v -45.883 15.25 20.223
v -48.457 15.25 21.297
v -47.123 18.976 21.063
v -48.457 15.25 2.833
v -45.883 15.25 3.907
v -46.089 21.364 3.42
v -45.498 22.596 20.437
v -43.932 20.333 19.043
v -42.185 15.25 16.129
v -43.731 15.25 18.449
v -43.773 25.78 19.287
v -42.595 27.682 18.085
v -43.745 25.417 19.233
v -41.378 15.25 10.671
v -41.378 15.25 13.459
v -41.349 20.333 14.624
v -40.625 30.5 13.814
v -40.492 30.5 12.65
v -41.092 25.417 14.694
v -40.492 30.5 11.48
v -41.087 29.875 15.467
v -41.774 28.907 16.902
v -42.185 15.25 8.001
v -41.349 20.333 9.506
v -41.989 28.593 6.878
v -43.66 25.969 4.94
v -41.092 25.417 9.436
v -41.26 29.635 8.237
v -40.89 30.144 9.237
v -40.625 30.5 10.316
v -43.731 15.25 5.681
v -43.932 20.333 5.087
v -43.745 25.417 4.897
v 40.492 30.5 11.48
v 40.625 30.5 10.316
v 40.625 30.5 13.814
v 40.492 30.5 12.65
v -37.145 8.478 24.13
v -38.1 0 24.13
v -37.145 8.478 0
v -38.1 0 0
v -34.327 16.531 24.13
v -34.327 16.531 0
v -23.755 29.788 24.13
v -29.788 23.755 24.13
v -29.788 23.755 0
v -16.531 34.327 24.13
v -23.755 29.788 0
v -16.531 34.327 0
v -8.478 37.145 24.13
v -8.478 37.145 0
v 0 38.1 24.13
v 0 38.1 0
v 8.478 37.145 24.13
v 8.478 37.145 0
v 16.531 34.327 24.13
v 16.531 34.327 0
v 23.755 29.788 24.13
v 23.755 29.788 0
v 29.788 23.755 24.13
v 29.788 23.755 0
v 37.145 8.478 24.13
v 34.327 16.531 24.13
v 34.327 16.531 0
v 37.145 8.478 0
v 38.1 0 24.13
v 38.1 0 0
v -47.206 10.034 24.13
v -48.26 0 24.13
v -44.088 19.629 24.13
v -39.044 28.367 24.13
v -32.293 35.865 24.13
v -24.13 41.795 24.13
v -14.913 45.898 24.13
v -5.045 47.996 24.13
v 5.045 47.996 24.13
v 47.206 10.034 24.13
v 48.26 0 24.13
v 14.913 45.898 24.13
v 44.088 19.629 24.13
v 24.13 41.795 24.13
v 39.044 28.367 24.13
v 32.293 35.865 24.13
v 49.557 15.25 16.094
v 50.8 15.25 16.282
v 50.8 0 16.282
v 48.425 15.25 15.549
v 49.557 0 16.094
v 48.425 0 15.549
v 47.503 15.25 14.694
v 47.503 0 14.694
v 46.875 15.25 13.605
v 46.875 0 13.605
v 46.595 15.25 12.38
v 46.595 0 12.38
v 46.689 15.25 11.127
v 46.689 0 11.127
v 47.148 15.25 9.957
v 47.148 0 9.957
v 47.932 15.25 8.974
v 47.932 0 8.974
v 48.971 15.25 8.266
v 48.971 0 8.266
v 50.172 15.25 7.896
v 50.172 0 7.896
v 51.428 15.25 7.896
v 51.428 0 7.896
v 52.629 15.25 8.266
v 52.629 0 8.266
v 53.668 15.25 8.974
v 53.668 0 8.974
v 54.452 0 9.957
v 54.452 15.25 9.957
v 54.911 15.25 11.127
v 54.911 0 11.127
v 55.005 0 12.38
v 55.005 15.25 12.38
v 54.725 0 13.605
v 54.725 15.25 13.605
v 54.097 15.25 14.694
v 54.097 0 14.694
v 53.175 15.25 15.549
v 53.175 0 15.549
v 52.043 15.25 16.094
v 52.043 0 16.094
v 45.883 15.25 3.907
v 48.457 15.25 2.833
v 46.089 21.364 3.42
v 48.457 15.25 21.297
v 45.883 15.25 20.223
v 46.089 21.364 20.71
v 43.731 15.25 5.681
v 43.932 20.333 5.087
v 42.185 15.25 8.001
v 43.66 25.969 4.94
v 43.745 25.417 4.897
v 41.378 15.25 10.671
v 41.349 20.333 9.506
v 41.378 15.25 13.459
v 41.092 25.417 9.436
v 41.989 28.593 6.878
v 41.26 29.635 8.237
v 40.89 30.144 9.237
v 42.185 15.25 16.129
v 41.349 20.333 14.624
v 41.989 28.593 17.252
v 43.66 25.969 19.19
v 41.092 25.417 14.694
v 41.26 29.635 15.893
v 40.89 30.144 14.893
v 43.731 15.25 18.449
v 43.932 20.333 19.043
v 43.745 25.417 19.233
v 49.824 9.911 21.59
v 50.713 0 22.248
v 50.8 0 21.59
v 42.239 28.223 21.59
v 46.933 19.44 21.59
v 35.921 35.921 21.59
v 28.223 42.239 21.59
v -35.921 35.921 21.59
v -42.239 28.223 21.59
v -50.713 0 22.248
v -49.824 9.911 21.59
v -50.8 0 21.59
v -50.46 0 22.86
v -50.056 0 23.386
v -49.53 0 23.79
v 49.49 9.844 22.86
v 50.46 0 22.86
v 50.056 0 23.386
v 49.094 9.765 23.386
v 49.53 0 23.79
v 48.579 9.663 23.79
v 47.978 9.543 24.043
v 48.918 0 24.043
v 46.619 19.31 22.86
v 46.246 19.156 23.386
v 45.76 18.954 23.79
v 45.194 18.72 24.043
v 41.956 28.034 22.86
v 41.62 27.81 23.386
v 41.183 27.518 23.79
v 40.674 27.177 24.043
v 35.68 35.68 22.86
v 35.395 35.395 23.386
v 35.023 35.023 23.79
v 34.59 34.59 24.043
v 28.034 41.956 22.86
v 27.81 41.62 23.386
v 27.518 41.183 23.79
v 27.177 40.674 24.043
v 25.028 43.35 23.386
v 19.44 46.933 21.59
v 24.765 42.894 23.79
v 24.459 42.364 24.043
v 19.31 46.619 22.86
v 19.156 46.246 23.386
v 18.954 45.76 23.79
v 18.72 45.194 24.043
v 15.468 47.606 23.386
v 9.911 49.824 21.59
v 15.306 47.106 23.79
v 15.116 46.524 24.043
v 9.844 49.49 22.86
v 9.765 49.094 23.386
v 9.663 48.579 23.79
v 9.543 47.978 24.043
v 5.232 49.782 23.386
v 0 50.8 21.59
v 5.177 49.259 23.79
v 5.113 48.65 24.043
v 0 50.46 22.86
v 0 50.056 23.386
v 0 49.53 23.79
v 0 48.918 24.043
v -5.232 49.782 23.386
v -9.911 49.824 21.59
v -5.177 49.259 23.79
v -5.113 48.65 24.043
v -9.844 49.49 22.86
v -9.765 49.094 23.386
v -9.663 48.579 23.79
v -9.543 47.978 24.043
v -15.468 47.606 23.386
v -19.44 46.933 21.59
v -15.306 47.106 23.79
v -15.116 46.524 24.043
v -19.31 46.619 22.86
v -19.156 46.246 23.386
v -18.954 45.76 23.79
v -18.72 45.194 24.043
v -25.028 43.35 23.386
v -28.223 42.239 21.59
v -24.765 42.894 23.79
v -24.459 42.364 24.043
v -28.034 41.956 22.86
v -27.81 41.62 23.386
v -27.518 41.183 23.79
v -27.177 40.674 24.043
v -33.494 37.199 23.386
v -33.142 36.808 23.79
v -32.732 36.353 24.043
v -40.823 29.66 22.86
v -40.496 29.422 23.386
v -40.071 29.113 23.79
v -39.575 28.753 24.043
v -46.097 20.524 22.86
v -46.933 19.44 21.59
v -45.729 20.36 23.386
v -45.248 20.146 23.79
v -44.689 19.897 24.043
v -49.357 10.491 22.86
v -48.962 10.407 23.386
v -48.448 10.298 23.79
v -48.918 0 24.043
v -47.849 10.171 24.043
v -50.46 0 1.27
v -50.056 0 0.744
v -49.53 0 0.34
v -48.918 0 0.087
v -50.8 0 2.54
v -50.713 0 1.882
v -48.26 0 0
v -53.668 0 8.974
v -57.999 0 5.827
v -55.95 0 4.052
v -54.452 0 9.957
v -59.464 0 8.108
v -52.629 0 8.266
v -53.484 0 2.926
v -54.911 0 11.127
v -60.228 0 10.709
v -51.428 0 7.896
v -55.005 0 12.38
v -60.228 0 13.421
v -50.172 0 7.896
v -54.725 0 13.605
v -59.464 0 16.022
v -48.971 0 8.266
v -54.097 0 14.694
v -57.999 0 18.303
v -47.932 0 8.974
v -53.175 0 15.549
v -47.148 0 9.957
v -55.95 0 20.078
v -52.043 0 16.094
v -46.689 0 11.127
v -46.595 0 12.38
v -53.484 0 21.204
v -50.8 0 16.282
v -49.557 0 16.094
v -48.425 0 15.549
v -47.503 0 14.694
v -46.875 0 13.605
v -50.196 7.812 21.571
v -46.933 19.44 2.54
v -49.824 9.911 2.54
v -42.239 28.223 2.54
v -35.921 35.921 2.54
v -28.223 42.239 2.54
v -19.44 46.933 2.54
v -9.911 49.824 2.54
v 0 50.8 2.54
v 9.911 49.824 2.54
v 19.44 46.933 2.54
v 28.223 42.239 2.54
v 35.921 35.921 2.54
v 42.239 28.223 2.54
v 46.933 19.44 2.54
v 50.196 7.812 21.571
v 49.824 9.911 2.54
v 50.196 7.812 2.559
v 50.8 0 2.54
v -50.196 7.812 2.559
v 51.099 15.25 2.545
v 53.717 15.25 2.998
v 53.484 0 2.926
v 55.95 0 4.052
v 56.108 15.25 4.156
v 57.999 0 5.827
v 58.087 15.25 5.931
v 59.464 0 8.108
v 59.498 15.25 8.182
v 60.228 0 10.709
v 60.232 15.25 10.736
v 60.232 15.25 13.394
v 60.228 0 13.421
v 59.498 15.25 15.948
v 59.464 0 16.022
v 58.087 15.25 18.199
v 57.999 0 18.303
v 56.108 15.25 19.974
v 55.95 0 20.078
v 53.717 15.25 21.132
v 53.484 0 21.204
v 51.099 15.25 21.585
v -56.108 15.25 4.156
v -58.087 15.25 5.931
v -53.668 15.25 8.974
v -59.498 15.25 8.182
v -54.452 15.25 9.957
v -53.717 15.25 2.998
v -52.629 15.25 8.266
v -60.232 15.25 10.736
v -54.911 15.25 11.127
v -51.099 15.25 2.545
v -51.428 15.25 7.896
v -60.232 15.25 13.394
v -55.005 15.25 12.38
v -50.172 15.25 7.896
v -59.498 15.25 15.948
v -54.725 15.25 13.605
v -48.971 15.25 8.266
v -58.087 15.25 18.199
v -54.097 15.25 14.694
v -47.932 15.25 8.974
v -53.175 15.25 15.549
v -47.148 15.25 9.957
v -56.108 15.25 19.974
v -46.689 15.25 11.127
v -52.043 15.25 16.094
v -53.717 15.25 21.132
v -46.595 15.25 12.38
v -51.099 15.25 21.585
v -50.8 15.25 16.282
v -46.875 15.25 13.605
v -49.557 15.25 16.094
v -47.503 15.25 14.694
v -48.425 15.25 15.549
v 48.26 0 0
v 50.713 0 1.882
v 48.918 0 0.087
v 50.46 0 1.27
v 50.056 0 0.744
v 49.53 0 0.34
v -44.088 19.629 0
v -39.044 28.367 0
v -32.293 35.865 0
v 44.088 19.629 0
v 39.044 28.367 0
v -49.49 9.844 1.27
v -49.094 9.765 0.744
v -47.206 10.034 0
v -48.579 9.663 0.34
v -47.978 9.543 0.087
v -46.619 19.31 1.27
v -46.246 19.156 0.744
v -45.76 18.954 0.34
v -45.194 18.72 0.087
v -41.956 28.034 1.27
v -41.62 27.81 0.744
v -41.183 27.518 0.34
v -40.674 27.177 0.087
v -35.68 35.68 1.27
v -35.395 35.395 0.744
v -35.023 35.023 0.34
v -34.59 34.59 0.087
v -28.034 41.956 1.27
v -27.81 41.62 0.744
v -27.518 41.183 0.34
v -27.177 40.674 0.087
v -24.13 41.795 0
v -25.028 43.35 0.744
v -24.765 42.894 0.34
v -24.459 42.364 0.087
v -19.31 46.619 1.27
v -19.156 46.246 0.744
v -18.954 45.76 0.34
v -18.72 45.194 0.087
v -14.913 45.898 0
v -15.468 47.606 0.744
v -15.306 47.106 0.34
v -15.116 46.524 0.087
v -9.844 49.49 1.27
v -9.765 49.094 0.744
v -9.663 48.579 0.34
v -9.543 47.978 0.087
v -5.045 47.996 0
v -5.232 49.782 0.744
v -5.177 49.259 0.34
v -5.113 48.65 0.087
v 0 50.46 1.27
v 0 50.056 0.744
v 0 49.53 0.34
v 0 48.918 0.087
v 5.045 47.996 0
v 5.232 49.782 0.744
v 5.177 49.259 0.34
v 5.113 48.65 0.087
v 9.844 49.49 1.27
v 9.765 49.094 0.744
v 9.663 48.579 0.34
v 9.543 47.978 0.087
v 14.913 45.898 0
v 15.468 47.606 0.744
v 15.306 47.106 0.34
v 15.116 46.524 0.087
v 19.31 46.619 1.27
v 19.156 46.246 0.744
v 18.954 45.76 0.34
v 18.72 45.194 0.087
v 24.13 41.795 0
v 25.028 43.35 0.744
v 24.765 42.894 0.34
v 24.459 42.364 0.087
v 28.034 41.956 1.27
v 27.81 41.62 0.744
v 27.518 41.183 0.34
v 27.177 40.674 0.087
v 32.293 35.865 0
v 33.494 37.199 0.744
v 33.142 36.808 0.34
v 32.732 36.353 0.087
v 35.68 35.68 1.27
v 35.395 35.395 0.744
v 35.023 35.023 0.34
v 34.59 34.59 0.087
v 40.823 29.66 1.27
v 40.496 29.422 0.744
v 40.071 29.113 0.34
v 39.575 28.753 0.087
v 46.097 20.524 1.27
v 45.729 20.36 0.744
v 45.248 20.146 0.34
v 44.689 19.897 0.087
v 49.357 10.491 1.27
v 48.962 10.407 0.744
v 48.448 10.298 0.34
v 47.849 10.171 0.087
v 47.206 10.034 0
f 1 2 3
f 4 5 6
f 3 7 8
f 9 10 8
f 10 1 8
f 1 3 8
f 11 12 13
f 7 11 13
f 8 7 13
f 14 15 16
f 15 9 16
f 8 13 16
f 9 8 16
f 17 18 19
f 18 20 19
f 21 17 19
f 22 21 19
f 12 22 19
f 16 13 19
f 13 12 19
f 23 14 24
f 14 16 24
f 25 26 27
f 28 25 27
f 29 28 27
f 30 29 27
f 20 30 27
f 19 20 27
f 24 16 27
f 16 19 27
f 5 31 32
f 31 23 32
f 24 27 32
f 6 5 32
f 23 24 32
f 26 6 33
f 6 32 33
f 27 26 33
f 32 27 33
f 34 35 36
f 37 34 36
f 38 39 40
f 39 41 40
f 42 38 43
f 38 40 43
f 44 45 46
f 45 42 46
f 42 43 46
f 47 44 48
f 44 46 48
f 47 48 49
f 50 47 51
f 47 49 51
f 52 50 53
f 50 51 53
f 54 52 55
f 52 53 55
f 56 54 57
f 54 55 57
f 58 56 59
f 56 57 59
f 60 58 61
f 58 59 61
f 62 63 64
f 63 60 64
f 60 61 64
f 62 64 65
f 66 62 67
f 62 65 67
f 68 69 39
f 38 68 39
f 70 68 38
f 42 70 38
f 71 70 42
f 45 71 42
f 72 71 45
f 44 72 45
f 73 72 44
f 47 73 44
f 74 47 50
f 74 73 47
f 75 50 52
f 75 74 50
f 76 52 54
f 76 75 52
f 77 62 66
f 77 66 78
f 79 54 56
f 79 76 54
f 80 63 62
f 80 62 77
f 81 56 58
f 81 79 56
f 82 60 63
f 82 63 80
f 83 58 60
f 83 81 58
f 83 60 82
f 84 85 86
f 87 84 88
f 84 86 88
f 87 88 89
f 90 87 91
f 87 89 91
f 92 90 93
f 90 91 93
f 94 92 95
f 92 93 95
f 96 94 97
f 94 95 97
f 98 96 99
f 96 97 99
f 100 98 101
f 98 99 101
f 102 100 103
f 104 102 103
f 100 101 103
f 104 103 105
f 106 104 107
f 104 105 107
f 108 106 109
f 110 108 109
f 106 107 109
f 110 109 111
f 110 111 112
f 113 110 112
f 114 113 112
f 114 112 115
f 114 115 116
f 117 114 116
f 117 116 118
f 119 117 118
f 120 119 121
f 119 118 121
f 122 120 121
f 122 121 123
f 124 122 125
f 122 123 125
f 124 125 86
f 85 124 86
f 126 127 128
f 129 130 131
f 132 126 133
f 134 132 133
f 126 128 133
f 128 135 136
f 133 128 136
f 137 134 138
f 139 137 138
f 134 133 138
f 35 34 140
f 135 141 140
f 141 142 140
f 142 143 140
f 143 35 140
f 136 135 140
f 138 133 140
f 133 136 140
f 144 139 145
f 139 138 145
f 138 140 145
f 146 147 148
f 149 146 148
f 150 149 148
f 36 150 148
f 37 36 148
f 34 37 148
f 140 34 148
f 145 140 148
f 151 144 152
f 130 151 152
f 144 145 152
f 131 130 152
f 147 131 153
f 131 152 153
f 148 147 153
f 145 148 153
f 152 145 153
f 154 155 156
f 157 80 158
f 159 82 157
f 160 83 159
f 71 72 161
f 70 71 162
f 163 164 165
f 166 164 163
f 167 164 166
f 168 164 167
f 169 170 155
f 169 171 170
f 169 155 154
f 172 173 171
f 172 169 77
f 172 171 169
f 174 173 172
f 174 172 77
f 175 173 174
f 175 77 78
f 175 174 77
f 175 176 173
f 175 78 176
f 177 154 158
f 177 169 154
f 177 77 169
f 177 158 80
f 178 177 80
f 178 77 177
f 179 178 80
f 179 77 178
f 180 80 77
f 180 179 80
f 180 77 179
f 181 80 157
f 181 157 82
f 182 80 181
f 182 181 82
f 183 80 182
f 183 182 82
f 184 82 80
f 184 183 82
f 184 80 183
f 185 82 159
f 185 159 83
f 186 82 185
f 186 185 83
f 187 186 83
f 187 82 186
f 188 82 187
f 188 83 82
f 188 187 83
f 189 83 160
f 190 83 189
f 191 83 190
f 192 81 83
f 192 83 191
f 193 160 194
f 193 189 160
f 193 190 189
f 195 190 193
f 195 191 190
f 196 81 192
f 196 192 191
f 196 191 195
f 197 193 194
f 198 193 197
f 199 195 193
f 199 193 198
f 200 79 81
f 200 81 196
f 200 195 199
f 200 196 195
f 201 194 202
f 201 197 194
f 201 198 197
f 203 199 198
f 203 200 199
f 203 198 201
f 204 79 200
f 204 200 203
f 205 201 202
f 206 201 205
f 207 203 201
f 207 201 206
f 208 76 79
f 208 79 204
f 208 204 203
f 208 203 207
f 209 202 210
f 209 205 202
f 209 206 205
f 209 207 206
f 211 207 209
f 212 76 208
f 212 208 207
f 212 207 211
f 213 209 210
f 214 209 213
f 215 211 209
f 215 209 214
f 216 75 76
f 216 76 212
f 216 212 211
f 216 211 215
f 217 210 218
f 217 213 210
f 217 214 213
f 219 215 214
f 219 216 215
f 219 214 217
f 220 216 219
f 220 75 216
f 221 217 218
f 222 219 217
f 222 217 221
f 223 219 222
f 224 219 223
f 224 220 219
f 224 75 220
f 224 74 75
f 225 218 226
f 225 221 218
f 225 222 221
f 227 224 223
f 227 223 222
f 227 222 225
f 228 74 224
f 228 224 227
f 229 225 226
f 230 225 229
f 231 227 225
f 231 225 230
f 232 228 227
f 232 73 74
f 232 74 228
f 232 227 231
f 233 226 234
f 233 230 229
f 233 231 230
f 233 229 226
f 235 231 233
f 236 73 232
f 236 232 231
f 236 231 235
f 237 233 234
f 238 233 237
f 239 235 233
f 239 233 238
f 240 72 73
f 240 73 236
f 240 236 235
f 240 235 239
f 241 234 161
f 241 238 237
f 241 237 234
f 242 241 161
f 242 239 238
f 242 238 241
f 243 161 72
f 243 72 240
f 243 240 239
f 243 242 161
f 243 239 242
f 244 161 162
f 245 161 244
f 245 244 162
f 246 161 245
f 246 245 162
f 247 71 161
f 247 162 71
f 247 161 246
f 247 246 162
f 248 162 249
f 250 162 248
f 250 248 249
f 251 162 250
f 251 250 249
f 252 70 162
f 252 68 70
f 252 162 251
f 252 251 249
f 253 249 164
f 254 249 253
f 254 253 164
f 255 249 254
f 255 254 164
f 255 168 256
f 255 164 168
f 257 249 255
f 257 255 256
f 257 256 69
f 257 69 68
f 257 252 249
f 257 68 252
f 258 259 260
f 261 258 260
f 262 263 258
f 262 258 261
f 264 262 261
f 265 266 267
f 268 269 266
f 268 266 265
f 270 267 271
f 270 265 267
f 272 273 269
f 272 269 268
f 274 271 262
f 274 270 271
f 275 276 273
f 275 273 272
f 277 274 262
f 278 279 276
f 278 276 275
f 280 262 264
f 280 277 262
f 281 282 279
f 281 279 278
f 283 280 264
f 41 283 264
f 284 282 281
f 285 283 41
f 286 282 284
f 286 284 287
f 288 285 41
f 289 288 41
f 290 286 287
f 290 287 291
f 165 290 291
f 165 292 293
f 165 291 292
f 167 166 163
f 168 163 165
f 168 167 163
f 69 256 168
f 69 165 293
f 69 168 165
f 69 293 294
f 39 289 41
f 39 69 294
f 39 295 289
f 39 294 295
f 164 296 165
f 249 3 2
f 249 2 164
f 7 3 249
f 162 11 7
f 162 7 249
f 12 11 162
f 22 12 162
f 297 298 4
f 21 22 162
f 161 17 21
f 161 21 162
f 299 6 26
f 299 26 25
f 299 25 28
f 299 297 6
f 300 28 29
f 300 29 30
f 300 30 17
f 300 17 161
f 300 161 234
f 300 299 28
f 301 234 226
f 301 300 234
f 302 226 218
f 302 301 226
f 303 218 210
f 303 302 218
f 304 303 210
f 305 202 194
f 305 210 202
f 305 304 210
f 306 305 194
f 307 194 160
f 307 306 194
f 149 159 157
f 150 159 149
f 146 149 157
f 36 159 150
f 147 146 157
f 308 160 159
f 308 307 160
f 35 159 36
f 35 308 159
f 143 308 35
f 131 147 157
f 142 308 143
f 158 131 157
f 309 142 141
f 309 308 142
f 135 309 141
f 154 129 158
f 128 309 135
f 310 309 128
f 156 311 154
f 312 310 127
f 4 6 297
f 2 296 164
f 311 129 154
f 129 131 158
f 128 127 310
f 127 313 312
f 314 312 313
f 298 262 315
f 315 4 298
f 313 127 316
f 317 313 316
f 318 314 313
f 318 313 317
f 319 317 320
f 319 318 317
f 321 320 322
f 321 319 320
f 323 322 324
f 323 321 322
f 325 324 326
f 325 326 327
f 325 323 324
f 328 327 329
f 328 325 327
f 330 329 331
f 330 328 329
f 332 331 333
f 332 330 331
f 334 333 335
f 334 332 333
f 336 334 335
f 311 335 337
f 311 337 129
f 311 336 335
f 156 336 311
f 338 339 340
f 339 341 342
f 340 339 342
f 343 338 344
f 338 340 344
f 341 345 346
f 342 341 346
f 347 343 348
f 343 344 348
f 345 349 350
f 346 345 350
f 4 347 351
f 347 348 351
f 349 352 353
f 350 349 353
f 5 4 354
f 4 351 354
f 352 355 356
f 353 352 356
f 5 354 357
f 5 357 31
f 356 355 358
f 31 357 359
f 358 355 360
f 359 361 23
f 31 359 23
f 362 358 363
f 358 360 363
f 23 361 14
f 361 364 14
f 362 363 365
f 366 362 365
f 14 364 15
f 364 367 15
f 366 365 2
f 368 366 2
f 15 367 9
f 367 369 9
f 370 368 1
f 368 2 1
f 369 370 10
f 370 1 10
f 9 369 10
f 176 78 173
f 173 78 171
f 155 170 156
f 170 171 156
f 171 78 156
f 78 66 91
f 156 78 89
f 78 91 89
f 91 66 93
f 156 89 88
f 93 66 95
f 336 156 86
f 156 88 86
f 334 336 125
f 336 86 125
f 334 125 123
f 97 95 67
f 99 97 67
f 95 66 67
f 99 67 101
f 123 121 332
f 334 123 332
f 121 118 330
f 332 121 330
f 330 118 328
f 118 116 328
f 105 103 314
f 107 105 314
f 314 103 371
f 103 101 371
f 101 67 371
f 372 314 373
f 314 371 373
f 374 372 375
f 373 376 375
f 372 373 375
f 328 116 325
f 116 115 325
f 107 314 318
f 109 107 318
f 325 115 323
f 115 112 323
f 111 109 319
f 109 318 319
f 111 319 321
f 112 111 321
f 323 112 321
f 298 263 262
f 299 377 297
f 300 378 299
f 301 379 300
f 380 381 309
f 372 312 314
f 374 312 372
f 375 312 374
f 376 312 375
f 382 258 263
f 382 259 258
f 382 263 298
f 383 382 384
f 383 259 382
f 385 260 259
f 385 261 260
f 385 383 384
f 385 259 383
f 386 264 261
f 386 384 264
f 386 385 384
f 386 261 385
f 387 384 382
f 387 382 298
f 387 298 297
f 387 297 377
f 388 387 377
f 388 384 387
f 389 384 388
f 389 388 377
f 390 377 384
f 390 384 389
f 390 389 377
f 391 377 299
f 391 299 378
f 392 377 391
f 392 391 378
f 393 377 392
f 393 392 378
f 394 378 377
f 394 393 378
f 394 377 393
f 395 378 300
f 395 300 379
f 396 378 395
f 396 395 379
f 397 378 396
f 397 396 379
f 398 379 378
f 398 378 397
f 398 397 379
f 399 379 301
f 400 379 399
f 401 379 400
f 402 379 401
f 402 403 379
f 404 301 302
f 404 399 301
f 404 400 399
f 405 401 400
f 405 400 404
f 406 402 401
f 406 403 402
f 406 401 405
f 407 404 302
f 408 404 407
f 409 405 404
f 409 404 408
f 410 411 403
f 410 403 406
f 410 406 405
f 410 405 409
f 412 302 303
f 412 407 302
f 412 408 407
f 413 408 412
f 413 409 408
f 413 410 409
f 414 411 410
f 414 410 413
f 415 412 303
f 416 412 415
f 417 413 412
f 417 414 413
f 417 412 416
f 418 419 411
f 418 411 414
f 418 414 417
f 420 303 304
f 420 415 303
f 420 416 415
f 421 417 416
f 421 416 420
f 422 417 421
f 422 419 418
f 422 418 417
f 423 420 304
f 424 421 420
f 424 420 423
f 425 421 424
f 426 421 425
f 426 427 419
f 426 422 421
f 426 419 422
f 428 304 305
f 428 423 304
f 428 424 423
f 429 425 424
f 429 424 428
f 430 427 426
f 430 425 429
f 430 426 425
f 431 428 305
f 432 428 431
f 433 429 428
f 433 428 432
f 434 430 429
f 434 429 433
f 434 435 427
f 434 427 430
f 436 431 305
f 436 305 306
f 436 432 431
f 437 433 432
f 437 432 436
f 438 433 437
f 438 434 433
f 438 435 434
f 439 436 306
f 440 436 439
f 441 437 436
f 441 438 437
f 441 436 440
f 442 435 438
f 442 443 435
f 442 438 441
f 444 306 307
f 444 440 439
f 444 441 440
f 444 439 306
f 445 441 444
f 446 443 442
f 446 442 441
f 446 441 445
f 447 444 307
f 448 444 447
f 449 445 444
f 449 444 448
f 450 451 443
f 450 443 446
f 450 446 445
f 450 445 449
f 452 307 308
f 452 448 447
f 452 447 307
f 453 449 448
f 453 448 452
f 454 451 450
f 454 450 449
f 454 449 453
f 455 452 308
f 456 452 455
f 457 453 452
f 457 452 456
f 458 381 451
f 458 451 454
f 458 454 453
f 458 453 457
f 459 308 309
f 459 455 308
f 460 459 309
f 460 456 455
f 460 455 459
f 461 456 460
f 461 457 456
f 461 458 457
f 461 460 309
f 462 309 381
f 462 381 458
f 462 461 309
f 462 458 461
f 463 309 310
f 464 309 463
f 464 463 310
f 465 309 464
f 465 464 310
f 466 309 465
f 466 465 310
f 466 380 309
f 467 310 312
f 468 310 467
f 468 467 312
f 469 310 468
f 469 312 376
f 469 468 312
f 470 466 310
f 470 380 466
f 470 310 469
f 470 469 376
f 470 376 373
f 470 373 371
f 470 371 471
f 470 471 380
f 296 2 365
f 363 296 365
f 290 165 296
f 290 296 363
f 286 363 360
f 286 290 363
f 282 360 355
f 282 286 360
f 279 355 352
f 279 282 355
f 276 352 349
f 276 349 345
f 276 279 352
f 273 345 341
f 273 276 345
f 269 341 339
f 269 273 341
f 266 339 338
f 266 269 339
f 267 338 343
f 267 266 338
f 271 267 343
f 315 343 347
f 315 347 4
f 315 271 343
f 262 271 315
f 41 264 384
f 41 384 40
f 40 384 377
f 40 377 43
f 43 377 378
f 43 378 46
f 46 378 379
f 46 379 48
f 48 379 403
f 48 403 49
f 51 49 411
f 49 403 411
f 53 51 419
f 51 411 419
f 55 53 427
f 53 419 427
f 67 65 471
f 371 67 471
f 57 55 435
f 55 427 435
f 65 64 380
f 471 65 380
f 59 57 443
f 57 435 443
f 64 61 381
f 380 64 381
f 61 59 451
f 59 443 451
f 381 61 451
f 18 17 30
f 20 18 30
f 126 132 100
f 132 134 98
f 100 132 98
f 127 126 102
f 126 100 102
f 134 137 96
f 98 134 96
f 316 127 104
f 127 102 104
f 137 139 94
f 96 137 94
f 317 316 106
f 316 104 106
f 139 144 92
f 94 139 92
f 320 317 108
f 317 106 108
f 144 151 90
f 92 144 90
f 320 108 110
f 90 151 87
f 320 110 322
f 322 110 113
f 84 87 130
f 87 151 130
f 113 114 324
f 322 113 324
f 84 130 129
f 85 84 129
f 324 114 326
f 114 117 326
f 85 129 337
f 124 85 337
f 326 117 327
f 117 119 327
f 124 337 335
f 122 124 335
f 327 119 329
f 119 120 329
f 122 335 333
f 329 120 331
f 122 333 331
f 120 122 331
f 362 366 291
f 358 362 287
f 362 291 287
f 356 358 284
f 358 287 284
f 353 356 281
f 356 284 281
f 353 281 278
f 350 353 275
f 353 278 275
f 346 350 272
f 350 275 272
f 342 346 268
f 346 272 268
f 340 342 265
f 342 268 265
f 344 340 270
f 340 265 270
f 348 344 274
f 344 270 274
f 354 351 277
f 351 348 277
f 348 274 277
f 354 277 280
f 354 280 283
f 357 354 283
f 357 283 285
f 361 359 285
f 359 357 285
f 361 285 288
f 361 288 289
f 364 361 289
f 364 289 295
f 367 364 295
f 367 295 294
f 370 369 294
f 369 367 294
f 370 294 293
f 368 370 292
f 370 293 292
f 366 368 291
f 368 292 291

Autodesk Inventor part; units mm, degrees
ref_plane "YZ Plane" through (0, 0, 0) normal (1, 0, 0) x (0, 1, 0)
ref_plane "XZ Plane" through (0, 0, 0) normal (0, 1, 0) x (-1, 0, 0)
ref_plane "XY Plane" through (0, 0, 0) normal (0, 0, 1) x (1, 0, 0)
sketch "Sketch1" plane through (0, 0, 0) normal (0, 0, 1) x (1, 0, 0)
  arc A0 (38.1, 0) -> (-38.1, 0) centre (0, 0) ccw
  arc A1 (50.8, 0) -> (-50.8, 0) centre (0, 0) ccw
  line L0 (-50.8, 0) -> (-38.1, 0)
  line L1 (38.1, 0) -> (50.8, 0)
  dimension "d0" = 76.2
  dimension "d1" = 12.7
extrude "Extrusion1" add sketch "Sketch1" along normal blind 24.13
sketch "Sketch2" plane through (38.1, 0, 0) normal (0, -1, 0) x (1, 0, 0)
  line L0 (12.7, 0) -> (12.7, 24.13) construction
  circle A0 centre (12.7, 12.065) radius 9.525
  point P0 (-38.1, 0)
  dimension "d4" = 19.05
extrude "Extrusion2" add sketch "Sketch2" against normal blind 15.25
sketch "Sketch3" plane through (38.1, 15.25, 0) normal (0, 1, 0) x (1, 0, 0)
  arc A0 (12.7, -21.59) -> (12.7, -2.54) centre (12.7, -12.065) ccw projected
  circle A1 centre (12.7, -12.065) radius 9.525
  point P0 (-38.1, 0)
  dimension "d7" = 19.05
extrude "Extrusion3" cut sketch "Sketch3" along normal blind 15.25 draft 3
sketch "Sketch4" plane through (38.1, 15.25, 0) normal (0, 1, 0) x (1, 0, 0)
  arc A0 (10.357, -21.2973) -> (10.357, -2.8327) centre (12.7, -12.065) ccw projected
  point P0 (-38.1, 0)
hole "Hole1" at (50.8, 15.25, 12.065) direction (0, -1, 0) diameter 8.433 end through all clearance for "Socket Head Cap Screw" size "5/16" standard "Ansi Unified Screw Threads"
mirror "Mirror1" about plane through (0, 0, 0) normal (1, 0, 0) of "Extrusion2", "Extrusion3", "Hole1"
fillet "Fillet1" radius 2.54 2 edges at (0, 50.8, 24.13) (0, 50.8, 0)
thread "Thread1" size "M9x1.25" class "6H" standard "ANSI Metric M Profile" full length
thread "Thread2" size "M9x1.25" class "6H" standard "ANSI Metric M Profile" full length
properties part number "Pistonhandattacher"
